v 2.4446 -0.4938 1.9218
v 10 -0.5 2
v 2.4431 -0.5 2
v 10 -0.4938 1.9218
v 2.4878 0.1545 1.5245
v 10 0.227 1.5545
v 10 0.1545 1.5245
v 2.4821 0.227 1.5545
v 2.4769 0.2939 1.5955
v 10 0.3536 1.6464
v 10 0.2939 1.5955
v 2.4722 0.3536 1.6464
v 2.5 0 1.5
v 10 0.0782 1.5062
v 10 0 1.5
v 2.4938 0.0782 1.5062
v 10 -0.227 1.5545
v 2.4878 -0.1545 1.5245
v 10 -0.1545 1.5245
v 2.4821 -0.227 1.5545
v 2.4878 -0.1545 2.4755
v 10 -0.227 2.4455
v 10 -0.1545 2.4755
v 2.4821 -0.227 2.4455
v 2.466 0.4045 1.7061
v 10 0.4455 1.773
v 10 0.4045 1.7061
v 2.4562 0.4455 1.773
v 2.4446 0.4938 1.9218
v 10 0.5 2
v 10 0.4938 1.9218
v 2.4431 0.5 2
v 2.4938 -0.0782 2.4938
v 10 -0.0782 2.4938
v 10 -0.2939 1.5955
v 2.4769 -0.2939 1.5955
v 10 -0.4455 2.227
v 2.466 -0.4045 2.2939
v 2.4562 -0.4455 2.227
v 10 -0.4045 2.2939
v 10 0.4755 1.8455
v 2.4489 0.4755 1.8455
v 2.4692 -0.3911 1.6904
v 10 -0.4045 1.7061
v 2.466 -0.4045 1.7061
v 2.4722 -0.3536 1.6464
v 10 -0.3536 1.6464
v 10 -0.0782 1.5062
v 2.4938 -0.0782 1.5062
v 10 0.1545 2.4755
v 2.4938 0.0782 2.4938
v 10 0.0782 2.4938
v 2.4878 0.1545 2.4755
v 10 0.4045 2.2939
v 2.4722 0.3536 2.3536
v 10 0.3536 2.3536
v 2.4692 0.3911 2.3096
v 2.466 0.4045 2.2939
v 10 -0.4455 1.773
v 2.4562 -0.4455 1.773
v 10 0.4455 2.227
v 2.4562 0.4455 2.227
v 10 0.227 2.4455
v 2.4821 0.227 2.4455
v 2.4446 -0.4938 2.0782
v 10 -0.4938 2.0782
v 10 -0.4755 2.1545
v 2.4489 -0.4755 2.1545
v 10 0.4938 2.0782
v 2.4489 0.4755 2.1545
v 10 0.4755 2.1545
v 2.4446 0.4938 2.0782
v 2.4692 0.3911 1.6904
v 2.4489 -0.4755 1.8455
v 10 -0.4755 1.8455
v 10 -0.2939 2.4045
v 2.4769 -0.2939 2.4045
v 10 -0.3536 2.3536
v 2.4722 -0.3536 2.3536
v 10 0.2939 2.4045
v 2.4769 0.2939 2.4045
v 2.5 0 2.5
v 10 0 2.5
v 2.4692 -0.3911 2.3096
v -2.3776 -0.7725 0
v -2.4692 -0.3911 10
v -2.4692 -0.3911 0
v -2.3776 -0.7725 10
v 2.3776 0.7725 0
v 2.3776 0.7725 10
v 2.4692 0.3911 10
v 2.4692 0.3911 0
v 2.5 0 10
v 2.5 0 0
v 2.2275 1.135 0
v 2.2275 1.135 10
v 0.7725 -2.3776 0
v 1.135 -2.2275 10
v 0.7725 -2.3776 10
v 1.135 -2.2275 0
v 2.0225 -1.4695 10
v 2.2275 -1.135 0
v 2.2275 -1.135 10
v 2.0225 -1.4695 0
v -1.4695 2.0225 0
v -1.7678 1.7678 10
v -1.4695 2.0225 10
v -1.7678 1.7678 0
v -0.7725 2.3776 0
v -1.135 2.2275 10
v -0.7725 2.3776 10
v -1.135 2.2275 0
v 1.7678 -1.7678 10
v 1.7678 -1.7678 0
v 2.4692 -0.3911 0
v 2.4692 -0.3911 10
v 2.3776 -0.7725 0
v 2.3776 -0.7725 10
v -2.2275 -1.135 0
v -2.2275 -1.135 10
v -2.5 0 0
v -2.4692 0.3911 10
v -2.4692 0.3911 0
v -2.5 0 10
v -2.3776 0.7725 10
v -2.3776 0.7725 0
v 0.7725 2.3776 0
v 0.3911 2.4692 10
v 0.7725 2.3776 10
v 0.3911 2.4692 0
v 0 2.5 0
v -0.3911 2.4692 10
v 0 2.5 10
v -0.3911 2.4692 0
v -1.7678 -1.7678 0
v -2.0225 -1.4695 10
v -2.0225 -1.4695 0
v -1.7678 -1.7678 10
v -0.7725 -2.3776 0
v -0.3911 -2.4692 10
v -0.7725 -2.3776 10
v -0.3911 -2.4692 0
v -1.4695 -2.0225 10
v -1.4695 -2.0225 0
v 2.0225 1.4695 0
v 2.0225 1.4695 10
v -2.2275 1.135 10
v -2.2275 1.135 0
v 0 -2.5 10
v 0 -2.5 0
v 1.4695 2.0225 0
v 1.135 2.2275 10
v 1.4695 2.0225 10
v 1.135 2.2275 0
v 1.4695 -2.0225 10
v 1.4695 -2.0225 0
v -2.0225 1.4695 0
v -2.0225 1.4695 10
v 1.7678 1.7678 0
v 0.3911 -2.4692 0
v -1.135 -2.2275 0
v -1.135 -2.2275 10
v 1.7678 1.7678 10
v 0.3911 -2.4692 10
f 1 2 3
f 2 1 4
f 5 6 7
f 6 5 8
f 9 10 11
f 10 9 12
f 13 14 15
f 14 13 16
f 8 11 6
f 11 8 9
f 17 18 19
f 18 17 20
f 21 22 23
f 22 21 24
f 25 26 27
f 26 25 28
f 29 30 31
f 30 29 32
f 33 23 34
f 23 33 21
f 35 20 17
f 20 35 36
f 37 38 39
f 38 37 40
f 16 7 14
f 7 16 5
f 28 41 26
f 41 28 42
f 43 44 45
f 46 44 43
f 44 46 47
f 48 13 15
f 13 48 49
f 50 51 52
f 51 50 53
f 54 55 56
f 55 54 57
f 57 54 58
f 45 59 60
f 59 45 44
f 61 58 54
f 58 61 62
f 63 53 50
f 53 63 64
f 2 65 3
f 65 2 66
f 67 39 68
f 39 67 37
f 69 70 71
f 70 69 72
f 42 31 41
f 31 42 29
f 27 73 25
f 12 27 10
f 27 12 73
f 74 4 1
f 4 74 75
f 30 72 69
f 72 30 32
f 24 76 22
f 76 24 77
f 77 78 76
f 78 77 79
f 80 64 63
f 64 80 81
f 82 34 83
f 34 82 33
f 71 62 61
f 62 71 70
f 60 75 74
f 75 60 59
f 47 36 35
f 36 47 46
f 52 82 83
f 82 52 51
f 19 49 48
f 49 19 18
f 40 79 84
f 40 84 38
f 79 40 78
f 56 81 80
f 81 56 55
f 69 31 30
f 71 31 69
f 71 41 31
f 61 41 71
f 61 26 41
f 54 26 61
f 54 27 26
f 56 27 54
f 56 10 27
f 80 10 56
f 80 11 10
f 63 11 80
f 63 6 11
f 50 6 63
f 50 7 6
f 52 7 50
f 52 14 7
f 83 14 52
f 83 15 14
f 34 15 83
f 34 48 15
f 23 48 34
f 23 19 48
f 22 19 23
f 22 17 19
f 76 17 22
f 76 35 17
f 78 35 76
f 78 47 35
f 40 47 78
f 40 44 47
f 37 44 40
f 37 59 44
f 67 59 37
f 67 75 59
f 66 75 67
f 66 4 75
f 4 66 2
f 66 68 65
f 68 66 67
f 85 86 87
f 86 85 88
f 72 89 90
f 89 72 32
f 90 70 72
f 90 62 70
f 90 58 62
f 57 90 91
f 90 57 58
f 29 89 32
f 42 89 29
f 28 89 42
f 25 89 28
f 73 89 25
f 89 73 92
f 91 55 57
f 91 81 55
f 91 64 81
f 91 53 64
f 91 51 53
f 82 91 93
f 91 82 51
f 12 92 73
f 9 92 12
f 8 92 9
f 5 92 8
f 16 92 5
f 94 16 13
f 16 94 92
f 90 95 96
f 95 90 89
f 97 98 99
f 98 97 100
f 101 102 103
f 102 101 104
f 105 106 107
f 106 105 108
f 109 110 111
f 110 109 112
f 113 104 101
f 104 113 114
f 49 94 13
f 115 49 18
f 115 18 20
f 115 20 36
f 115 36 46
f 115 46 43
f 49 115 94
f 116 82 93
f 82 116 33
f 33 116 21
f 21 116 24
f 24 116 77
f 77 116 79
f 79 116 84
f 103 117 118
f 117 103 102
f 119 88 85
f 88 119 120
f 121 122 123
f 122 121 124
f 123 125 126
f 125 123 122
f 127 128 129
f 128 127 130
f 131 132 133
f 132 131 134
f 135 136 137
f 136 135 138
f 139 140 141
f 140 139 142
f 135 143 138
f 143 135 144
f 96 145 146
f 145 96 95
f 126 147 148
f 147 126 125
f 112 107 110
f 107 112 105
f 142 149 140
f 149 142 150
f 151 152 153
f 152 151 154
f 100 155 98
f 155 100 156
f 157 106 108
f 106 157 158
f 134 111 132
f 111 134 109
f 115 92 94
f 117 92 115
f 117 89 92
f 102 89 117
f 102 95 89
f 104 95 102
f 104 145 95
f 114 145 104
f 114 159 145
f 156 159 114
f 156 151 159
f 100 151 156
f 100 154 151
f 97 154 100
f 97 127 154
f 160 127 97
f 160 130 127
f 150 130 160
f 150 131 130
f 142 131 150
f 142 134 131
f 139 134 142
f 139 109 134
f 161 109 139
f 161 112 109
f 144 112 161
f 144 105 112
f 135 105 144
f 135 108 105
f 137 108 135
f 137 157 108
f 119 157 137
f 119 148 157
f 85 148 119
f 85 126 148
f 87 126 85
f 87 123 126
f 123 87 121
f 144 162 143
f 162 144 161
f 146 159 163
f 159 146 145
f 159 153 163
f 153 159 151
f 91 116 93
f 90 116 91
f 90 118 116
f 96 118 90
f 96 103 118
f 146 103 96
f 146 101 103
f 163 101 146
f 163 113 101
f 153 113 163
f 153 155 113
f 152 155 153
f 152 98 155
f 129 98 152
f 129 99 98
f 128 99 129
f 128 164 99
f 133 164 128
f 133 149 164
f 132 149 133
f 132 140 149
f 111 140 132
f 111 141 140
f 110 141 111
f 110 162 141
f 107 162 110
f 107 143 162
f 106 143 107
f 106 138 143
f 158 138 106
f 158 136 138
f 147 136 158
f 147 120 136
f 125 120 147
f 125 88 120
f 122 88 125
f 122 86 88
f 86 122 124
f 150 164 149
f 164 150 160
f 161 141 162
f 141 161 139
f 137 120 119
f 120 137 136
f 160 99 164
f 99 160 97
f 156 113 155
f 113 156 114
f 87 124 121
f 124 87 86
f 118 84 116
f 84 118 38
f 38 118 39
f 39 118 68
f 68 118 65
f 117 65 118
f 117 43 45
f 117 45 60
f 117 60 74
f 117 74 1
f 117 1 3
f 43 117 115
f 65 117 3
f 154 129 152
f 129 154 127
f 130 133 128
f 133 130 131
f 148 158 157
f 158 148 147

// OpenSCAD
// Programm Modul über type auswählen:


type = 2; //Hier den Typ eingeben: 1=Kugel, 2=Zylinder, 3=Kegel




$fn=40;
test();
module select() {
    if (type == 1) {
        kugel();
    } else if (type == 2) {
        zylinder();
    } else if (type == 3) {
        kegel(); }
}

module test(){
    union() {
    rotate(a=[0,90,0])translate([-2,0,0])cylinder(h=10, d=1);
    select();
    }
}


module kugel(){
sphere(3);
 }
 
 module zylinder(){
cylinder(h=10, d=5);  
}

 module kegel(){
cylinder(h=10, d1=5, d2=0);   
}
 
 
